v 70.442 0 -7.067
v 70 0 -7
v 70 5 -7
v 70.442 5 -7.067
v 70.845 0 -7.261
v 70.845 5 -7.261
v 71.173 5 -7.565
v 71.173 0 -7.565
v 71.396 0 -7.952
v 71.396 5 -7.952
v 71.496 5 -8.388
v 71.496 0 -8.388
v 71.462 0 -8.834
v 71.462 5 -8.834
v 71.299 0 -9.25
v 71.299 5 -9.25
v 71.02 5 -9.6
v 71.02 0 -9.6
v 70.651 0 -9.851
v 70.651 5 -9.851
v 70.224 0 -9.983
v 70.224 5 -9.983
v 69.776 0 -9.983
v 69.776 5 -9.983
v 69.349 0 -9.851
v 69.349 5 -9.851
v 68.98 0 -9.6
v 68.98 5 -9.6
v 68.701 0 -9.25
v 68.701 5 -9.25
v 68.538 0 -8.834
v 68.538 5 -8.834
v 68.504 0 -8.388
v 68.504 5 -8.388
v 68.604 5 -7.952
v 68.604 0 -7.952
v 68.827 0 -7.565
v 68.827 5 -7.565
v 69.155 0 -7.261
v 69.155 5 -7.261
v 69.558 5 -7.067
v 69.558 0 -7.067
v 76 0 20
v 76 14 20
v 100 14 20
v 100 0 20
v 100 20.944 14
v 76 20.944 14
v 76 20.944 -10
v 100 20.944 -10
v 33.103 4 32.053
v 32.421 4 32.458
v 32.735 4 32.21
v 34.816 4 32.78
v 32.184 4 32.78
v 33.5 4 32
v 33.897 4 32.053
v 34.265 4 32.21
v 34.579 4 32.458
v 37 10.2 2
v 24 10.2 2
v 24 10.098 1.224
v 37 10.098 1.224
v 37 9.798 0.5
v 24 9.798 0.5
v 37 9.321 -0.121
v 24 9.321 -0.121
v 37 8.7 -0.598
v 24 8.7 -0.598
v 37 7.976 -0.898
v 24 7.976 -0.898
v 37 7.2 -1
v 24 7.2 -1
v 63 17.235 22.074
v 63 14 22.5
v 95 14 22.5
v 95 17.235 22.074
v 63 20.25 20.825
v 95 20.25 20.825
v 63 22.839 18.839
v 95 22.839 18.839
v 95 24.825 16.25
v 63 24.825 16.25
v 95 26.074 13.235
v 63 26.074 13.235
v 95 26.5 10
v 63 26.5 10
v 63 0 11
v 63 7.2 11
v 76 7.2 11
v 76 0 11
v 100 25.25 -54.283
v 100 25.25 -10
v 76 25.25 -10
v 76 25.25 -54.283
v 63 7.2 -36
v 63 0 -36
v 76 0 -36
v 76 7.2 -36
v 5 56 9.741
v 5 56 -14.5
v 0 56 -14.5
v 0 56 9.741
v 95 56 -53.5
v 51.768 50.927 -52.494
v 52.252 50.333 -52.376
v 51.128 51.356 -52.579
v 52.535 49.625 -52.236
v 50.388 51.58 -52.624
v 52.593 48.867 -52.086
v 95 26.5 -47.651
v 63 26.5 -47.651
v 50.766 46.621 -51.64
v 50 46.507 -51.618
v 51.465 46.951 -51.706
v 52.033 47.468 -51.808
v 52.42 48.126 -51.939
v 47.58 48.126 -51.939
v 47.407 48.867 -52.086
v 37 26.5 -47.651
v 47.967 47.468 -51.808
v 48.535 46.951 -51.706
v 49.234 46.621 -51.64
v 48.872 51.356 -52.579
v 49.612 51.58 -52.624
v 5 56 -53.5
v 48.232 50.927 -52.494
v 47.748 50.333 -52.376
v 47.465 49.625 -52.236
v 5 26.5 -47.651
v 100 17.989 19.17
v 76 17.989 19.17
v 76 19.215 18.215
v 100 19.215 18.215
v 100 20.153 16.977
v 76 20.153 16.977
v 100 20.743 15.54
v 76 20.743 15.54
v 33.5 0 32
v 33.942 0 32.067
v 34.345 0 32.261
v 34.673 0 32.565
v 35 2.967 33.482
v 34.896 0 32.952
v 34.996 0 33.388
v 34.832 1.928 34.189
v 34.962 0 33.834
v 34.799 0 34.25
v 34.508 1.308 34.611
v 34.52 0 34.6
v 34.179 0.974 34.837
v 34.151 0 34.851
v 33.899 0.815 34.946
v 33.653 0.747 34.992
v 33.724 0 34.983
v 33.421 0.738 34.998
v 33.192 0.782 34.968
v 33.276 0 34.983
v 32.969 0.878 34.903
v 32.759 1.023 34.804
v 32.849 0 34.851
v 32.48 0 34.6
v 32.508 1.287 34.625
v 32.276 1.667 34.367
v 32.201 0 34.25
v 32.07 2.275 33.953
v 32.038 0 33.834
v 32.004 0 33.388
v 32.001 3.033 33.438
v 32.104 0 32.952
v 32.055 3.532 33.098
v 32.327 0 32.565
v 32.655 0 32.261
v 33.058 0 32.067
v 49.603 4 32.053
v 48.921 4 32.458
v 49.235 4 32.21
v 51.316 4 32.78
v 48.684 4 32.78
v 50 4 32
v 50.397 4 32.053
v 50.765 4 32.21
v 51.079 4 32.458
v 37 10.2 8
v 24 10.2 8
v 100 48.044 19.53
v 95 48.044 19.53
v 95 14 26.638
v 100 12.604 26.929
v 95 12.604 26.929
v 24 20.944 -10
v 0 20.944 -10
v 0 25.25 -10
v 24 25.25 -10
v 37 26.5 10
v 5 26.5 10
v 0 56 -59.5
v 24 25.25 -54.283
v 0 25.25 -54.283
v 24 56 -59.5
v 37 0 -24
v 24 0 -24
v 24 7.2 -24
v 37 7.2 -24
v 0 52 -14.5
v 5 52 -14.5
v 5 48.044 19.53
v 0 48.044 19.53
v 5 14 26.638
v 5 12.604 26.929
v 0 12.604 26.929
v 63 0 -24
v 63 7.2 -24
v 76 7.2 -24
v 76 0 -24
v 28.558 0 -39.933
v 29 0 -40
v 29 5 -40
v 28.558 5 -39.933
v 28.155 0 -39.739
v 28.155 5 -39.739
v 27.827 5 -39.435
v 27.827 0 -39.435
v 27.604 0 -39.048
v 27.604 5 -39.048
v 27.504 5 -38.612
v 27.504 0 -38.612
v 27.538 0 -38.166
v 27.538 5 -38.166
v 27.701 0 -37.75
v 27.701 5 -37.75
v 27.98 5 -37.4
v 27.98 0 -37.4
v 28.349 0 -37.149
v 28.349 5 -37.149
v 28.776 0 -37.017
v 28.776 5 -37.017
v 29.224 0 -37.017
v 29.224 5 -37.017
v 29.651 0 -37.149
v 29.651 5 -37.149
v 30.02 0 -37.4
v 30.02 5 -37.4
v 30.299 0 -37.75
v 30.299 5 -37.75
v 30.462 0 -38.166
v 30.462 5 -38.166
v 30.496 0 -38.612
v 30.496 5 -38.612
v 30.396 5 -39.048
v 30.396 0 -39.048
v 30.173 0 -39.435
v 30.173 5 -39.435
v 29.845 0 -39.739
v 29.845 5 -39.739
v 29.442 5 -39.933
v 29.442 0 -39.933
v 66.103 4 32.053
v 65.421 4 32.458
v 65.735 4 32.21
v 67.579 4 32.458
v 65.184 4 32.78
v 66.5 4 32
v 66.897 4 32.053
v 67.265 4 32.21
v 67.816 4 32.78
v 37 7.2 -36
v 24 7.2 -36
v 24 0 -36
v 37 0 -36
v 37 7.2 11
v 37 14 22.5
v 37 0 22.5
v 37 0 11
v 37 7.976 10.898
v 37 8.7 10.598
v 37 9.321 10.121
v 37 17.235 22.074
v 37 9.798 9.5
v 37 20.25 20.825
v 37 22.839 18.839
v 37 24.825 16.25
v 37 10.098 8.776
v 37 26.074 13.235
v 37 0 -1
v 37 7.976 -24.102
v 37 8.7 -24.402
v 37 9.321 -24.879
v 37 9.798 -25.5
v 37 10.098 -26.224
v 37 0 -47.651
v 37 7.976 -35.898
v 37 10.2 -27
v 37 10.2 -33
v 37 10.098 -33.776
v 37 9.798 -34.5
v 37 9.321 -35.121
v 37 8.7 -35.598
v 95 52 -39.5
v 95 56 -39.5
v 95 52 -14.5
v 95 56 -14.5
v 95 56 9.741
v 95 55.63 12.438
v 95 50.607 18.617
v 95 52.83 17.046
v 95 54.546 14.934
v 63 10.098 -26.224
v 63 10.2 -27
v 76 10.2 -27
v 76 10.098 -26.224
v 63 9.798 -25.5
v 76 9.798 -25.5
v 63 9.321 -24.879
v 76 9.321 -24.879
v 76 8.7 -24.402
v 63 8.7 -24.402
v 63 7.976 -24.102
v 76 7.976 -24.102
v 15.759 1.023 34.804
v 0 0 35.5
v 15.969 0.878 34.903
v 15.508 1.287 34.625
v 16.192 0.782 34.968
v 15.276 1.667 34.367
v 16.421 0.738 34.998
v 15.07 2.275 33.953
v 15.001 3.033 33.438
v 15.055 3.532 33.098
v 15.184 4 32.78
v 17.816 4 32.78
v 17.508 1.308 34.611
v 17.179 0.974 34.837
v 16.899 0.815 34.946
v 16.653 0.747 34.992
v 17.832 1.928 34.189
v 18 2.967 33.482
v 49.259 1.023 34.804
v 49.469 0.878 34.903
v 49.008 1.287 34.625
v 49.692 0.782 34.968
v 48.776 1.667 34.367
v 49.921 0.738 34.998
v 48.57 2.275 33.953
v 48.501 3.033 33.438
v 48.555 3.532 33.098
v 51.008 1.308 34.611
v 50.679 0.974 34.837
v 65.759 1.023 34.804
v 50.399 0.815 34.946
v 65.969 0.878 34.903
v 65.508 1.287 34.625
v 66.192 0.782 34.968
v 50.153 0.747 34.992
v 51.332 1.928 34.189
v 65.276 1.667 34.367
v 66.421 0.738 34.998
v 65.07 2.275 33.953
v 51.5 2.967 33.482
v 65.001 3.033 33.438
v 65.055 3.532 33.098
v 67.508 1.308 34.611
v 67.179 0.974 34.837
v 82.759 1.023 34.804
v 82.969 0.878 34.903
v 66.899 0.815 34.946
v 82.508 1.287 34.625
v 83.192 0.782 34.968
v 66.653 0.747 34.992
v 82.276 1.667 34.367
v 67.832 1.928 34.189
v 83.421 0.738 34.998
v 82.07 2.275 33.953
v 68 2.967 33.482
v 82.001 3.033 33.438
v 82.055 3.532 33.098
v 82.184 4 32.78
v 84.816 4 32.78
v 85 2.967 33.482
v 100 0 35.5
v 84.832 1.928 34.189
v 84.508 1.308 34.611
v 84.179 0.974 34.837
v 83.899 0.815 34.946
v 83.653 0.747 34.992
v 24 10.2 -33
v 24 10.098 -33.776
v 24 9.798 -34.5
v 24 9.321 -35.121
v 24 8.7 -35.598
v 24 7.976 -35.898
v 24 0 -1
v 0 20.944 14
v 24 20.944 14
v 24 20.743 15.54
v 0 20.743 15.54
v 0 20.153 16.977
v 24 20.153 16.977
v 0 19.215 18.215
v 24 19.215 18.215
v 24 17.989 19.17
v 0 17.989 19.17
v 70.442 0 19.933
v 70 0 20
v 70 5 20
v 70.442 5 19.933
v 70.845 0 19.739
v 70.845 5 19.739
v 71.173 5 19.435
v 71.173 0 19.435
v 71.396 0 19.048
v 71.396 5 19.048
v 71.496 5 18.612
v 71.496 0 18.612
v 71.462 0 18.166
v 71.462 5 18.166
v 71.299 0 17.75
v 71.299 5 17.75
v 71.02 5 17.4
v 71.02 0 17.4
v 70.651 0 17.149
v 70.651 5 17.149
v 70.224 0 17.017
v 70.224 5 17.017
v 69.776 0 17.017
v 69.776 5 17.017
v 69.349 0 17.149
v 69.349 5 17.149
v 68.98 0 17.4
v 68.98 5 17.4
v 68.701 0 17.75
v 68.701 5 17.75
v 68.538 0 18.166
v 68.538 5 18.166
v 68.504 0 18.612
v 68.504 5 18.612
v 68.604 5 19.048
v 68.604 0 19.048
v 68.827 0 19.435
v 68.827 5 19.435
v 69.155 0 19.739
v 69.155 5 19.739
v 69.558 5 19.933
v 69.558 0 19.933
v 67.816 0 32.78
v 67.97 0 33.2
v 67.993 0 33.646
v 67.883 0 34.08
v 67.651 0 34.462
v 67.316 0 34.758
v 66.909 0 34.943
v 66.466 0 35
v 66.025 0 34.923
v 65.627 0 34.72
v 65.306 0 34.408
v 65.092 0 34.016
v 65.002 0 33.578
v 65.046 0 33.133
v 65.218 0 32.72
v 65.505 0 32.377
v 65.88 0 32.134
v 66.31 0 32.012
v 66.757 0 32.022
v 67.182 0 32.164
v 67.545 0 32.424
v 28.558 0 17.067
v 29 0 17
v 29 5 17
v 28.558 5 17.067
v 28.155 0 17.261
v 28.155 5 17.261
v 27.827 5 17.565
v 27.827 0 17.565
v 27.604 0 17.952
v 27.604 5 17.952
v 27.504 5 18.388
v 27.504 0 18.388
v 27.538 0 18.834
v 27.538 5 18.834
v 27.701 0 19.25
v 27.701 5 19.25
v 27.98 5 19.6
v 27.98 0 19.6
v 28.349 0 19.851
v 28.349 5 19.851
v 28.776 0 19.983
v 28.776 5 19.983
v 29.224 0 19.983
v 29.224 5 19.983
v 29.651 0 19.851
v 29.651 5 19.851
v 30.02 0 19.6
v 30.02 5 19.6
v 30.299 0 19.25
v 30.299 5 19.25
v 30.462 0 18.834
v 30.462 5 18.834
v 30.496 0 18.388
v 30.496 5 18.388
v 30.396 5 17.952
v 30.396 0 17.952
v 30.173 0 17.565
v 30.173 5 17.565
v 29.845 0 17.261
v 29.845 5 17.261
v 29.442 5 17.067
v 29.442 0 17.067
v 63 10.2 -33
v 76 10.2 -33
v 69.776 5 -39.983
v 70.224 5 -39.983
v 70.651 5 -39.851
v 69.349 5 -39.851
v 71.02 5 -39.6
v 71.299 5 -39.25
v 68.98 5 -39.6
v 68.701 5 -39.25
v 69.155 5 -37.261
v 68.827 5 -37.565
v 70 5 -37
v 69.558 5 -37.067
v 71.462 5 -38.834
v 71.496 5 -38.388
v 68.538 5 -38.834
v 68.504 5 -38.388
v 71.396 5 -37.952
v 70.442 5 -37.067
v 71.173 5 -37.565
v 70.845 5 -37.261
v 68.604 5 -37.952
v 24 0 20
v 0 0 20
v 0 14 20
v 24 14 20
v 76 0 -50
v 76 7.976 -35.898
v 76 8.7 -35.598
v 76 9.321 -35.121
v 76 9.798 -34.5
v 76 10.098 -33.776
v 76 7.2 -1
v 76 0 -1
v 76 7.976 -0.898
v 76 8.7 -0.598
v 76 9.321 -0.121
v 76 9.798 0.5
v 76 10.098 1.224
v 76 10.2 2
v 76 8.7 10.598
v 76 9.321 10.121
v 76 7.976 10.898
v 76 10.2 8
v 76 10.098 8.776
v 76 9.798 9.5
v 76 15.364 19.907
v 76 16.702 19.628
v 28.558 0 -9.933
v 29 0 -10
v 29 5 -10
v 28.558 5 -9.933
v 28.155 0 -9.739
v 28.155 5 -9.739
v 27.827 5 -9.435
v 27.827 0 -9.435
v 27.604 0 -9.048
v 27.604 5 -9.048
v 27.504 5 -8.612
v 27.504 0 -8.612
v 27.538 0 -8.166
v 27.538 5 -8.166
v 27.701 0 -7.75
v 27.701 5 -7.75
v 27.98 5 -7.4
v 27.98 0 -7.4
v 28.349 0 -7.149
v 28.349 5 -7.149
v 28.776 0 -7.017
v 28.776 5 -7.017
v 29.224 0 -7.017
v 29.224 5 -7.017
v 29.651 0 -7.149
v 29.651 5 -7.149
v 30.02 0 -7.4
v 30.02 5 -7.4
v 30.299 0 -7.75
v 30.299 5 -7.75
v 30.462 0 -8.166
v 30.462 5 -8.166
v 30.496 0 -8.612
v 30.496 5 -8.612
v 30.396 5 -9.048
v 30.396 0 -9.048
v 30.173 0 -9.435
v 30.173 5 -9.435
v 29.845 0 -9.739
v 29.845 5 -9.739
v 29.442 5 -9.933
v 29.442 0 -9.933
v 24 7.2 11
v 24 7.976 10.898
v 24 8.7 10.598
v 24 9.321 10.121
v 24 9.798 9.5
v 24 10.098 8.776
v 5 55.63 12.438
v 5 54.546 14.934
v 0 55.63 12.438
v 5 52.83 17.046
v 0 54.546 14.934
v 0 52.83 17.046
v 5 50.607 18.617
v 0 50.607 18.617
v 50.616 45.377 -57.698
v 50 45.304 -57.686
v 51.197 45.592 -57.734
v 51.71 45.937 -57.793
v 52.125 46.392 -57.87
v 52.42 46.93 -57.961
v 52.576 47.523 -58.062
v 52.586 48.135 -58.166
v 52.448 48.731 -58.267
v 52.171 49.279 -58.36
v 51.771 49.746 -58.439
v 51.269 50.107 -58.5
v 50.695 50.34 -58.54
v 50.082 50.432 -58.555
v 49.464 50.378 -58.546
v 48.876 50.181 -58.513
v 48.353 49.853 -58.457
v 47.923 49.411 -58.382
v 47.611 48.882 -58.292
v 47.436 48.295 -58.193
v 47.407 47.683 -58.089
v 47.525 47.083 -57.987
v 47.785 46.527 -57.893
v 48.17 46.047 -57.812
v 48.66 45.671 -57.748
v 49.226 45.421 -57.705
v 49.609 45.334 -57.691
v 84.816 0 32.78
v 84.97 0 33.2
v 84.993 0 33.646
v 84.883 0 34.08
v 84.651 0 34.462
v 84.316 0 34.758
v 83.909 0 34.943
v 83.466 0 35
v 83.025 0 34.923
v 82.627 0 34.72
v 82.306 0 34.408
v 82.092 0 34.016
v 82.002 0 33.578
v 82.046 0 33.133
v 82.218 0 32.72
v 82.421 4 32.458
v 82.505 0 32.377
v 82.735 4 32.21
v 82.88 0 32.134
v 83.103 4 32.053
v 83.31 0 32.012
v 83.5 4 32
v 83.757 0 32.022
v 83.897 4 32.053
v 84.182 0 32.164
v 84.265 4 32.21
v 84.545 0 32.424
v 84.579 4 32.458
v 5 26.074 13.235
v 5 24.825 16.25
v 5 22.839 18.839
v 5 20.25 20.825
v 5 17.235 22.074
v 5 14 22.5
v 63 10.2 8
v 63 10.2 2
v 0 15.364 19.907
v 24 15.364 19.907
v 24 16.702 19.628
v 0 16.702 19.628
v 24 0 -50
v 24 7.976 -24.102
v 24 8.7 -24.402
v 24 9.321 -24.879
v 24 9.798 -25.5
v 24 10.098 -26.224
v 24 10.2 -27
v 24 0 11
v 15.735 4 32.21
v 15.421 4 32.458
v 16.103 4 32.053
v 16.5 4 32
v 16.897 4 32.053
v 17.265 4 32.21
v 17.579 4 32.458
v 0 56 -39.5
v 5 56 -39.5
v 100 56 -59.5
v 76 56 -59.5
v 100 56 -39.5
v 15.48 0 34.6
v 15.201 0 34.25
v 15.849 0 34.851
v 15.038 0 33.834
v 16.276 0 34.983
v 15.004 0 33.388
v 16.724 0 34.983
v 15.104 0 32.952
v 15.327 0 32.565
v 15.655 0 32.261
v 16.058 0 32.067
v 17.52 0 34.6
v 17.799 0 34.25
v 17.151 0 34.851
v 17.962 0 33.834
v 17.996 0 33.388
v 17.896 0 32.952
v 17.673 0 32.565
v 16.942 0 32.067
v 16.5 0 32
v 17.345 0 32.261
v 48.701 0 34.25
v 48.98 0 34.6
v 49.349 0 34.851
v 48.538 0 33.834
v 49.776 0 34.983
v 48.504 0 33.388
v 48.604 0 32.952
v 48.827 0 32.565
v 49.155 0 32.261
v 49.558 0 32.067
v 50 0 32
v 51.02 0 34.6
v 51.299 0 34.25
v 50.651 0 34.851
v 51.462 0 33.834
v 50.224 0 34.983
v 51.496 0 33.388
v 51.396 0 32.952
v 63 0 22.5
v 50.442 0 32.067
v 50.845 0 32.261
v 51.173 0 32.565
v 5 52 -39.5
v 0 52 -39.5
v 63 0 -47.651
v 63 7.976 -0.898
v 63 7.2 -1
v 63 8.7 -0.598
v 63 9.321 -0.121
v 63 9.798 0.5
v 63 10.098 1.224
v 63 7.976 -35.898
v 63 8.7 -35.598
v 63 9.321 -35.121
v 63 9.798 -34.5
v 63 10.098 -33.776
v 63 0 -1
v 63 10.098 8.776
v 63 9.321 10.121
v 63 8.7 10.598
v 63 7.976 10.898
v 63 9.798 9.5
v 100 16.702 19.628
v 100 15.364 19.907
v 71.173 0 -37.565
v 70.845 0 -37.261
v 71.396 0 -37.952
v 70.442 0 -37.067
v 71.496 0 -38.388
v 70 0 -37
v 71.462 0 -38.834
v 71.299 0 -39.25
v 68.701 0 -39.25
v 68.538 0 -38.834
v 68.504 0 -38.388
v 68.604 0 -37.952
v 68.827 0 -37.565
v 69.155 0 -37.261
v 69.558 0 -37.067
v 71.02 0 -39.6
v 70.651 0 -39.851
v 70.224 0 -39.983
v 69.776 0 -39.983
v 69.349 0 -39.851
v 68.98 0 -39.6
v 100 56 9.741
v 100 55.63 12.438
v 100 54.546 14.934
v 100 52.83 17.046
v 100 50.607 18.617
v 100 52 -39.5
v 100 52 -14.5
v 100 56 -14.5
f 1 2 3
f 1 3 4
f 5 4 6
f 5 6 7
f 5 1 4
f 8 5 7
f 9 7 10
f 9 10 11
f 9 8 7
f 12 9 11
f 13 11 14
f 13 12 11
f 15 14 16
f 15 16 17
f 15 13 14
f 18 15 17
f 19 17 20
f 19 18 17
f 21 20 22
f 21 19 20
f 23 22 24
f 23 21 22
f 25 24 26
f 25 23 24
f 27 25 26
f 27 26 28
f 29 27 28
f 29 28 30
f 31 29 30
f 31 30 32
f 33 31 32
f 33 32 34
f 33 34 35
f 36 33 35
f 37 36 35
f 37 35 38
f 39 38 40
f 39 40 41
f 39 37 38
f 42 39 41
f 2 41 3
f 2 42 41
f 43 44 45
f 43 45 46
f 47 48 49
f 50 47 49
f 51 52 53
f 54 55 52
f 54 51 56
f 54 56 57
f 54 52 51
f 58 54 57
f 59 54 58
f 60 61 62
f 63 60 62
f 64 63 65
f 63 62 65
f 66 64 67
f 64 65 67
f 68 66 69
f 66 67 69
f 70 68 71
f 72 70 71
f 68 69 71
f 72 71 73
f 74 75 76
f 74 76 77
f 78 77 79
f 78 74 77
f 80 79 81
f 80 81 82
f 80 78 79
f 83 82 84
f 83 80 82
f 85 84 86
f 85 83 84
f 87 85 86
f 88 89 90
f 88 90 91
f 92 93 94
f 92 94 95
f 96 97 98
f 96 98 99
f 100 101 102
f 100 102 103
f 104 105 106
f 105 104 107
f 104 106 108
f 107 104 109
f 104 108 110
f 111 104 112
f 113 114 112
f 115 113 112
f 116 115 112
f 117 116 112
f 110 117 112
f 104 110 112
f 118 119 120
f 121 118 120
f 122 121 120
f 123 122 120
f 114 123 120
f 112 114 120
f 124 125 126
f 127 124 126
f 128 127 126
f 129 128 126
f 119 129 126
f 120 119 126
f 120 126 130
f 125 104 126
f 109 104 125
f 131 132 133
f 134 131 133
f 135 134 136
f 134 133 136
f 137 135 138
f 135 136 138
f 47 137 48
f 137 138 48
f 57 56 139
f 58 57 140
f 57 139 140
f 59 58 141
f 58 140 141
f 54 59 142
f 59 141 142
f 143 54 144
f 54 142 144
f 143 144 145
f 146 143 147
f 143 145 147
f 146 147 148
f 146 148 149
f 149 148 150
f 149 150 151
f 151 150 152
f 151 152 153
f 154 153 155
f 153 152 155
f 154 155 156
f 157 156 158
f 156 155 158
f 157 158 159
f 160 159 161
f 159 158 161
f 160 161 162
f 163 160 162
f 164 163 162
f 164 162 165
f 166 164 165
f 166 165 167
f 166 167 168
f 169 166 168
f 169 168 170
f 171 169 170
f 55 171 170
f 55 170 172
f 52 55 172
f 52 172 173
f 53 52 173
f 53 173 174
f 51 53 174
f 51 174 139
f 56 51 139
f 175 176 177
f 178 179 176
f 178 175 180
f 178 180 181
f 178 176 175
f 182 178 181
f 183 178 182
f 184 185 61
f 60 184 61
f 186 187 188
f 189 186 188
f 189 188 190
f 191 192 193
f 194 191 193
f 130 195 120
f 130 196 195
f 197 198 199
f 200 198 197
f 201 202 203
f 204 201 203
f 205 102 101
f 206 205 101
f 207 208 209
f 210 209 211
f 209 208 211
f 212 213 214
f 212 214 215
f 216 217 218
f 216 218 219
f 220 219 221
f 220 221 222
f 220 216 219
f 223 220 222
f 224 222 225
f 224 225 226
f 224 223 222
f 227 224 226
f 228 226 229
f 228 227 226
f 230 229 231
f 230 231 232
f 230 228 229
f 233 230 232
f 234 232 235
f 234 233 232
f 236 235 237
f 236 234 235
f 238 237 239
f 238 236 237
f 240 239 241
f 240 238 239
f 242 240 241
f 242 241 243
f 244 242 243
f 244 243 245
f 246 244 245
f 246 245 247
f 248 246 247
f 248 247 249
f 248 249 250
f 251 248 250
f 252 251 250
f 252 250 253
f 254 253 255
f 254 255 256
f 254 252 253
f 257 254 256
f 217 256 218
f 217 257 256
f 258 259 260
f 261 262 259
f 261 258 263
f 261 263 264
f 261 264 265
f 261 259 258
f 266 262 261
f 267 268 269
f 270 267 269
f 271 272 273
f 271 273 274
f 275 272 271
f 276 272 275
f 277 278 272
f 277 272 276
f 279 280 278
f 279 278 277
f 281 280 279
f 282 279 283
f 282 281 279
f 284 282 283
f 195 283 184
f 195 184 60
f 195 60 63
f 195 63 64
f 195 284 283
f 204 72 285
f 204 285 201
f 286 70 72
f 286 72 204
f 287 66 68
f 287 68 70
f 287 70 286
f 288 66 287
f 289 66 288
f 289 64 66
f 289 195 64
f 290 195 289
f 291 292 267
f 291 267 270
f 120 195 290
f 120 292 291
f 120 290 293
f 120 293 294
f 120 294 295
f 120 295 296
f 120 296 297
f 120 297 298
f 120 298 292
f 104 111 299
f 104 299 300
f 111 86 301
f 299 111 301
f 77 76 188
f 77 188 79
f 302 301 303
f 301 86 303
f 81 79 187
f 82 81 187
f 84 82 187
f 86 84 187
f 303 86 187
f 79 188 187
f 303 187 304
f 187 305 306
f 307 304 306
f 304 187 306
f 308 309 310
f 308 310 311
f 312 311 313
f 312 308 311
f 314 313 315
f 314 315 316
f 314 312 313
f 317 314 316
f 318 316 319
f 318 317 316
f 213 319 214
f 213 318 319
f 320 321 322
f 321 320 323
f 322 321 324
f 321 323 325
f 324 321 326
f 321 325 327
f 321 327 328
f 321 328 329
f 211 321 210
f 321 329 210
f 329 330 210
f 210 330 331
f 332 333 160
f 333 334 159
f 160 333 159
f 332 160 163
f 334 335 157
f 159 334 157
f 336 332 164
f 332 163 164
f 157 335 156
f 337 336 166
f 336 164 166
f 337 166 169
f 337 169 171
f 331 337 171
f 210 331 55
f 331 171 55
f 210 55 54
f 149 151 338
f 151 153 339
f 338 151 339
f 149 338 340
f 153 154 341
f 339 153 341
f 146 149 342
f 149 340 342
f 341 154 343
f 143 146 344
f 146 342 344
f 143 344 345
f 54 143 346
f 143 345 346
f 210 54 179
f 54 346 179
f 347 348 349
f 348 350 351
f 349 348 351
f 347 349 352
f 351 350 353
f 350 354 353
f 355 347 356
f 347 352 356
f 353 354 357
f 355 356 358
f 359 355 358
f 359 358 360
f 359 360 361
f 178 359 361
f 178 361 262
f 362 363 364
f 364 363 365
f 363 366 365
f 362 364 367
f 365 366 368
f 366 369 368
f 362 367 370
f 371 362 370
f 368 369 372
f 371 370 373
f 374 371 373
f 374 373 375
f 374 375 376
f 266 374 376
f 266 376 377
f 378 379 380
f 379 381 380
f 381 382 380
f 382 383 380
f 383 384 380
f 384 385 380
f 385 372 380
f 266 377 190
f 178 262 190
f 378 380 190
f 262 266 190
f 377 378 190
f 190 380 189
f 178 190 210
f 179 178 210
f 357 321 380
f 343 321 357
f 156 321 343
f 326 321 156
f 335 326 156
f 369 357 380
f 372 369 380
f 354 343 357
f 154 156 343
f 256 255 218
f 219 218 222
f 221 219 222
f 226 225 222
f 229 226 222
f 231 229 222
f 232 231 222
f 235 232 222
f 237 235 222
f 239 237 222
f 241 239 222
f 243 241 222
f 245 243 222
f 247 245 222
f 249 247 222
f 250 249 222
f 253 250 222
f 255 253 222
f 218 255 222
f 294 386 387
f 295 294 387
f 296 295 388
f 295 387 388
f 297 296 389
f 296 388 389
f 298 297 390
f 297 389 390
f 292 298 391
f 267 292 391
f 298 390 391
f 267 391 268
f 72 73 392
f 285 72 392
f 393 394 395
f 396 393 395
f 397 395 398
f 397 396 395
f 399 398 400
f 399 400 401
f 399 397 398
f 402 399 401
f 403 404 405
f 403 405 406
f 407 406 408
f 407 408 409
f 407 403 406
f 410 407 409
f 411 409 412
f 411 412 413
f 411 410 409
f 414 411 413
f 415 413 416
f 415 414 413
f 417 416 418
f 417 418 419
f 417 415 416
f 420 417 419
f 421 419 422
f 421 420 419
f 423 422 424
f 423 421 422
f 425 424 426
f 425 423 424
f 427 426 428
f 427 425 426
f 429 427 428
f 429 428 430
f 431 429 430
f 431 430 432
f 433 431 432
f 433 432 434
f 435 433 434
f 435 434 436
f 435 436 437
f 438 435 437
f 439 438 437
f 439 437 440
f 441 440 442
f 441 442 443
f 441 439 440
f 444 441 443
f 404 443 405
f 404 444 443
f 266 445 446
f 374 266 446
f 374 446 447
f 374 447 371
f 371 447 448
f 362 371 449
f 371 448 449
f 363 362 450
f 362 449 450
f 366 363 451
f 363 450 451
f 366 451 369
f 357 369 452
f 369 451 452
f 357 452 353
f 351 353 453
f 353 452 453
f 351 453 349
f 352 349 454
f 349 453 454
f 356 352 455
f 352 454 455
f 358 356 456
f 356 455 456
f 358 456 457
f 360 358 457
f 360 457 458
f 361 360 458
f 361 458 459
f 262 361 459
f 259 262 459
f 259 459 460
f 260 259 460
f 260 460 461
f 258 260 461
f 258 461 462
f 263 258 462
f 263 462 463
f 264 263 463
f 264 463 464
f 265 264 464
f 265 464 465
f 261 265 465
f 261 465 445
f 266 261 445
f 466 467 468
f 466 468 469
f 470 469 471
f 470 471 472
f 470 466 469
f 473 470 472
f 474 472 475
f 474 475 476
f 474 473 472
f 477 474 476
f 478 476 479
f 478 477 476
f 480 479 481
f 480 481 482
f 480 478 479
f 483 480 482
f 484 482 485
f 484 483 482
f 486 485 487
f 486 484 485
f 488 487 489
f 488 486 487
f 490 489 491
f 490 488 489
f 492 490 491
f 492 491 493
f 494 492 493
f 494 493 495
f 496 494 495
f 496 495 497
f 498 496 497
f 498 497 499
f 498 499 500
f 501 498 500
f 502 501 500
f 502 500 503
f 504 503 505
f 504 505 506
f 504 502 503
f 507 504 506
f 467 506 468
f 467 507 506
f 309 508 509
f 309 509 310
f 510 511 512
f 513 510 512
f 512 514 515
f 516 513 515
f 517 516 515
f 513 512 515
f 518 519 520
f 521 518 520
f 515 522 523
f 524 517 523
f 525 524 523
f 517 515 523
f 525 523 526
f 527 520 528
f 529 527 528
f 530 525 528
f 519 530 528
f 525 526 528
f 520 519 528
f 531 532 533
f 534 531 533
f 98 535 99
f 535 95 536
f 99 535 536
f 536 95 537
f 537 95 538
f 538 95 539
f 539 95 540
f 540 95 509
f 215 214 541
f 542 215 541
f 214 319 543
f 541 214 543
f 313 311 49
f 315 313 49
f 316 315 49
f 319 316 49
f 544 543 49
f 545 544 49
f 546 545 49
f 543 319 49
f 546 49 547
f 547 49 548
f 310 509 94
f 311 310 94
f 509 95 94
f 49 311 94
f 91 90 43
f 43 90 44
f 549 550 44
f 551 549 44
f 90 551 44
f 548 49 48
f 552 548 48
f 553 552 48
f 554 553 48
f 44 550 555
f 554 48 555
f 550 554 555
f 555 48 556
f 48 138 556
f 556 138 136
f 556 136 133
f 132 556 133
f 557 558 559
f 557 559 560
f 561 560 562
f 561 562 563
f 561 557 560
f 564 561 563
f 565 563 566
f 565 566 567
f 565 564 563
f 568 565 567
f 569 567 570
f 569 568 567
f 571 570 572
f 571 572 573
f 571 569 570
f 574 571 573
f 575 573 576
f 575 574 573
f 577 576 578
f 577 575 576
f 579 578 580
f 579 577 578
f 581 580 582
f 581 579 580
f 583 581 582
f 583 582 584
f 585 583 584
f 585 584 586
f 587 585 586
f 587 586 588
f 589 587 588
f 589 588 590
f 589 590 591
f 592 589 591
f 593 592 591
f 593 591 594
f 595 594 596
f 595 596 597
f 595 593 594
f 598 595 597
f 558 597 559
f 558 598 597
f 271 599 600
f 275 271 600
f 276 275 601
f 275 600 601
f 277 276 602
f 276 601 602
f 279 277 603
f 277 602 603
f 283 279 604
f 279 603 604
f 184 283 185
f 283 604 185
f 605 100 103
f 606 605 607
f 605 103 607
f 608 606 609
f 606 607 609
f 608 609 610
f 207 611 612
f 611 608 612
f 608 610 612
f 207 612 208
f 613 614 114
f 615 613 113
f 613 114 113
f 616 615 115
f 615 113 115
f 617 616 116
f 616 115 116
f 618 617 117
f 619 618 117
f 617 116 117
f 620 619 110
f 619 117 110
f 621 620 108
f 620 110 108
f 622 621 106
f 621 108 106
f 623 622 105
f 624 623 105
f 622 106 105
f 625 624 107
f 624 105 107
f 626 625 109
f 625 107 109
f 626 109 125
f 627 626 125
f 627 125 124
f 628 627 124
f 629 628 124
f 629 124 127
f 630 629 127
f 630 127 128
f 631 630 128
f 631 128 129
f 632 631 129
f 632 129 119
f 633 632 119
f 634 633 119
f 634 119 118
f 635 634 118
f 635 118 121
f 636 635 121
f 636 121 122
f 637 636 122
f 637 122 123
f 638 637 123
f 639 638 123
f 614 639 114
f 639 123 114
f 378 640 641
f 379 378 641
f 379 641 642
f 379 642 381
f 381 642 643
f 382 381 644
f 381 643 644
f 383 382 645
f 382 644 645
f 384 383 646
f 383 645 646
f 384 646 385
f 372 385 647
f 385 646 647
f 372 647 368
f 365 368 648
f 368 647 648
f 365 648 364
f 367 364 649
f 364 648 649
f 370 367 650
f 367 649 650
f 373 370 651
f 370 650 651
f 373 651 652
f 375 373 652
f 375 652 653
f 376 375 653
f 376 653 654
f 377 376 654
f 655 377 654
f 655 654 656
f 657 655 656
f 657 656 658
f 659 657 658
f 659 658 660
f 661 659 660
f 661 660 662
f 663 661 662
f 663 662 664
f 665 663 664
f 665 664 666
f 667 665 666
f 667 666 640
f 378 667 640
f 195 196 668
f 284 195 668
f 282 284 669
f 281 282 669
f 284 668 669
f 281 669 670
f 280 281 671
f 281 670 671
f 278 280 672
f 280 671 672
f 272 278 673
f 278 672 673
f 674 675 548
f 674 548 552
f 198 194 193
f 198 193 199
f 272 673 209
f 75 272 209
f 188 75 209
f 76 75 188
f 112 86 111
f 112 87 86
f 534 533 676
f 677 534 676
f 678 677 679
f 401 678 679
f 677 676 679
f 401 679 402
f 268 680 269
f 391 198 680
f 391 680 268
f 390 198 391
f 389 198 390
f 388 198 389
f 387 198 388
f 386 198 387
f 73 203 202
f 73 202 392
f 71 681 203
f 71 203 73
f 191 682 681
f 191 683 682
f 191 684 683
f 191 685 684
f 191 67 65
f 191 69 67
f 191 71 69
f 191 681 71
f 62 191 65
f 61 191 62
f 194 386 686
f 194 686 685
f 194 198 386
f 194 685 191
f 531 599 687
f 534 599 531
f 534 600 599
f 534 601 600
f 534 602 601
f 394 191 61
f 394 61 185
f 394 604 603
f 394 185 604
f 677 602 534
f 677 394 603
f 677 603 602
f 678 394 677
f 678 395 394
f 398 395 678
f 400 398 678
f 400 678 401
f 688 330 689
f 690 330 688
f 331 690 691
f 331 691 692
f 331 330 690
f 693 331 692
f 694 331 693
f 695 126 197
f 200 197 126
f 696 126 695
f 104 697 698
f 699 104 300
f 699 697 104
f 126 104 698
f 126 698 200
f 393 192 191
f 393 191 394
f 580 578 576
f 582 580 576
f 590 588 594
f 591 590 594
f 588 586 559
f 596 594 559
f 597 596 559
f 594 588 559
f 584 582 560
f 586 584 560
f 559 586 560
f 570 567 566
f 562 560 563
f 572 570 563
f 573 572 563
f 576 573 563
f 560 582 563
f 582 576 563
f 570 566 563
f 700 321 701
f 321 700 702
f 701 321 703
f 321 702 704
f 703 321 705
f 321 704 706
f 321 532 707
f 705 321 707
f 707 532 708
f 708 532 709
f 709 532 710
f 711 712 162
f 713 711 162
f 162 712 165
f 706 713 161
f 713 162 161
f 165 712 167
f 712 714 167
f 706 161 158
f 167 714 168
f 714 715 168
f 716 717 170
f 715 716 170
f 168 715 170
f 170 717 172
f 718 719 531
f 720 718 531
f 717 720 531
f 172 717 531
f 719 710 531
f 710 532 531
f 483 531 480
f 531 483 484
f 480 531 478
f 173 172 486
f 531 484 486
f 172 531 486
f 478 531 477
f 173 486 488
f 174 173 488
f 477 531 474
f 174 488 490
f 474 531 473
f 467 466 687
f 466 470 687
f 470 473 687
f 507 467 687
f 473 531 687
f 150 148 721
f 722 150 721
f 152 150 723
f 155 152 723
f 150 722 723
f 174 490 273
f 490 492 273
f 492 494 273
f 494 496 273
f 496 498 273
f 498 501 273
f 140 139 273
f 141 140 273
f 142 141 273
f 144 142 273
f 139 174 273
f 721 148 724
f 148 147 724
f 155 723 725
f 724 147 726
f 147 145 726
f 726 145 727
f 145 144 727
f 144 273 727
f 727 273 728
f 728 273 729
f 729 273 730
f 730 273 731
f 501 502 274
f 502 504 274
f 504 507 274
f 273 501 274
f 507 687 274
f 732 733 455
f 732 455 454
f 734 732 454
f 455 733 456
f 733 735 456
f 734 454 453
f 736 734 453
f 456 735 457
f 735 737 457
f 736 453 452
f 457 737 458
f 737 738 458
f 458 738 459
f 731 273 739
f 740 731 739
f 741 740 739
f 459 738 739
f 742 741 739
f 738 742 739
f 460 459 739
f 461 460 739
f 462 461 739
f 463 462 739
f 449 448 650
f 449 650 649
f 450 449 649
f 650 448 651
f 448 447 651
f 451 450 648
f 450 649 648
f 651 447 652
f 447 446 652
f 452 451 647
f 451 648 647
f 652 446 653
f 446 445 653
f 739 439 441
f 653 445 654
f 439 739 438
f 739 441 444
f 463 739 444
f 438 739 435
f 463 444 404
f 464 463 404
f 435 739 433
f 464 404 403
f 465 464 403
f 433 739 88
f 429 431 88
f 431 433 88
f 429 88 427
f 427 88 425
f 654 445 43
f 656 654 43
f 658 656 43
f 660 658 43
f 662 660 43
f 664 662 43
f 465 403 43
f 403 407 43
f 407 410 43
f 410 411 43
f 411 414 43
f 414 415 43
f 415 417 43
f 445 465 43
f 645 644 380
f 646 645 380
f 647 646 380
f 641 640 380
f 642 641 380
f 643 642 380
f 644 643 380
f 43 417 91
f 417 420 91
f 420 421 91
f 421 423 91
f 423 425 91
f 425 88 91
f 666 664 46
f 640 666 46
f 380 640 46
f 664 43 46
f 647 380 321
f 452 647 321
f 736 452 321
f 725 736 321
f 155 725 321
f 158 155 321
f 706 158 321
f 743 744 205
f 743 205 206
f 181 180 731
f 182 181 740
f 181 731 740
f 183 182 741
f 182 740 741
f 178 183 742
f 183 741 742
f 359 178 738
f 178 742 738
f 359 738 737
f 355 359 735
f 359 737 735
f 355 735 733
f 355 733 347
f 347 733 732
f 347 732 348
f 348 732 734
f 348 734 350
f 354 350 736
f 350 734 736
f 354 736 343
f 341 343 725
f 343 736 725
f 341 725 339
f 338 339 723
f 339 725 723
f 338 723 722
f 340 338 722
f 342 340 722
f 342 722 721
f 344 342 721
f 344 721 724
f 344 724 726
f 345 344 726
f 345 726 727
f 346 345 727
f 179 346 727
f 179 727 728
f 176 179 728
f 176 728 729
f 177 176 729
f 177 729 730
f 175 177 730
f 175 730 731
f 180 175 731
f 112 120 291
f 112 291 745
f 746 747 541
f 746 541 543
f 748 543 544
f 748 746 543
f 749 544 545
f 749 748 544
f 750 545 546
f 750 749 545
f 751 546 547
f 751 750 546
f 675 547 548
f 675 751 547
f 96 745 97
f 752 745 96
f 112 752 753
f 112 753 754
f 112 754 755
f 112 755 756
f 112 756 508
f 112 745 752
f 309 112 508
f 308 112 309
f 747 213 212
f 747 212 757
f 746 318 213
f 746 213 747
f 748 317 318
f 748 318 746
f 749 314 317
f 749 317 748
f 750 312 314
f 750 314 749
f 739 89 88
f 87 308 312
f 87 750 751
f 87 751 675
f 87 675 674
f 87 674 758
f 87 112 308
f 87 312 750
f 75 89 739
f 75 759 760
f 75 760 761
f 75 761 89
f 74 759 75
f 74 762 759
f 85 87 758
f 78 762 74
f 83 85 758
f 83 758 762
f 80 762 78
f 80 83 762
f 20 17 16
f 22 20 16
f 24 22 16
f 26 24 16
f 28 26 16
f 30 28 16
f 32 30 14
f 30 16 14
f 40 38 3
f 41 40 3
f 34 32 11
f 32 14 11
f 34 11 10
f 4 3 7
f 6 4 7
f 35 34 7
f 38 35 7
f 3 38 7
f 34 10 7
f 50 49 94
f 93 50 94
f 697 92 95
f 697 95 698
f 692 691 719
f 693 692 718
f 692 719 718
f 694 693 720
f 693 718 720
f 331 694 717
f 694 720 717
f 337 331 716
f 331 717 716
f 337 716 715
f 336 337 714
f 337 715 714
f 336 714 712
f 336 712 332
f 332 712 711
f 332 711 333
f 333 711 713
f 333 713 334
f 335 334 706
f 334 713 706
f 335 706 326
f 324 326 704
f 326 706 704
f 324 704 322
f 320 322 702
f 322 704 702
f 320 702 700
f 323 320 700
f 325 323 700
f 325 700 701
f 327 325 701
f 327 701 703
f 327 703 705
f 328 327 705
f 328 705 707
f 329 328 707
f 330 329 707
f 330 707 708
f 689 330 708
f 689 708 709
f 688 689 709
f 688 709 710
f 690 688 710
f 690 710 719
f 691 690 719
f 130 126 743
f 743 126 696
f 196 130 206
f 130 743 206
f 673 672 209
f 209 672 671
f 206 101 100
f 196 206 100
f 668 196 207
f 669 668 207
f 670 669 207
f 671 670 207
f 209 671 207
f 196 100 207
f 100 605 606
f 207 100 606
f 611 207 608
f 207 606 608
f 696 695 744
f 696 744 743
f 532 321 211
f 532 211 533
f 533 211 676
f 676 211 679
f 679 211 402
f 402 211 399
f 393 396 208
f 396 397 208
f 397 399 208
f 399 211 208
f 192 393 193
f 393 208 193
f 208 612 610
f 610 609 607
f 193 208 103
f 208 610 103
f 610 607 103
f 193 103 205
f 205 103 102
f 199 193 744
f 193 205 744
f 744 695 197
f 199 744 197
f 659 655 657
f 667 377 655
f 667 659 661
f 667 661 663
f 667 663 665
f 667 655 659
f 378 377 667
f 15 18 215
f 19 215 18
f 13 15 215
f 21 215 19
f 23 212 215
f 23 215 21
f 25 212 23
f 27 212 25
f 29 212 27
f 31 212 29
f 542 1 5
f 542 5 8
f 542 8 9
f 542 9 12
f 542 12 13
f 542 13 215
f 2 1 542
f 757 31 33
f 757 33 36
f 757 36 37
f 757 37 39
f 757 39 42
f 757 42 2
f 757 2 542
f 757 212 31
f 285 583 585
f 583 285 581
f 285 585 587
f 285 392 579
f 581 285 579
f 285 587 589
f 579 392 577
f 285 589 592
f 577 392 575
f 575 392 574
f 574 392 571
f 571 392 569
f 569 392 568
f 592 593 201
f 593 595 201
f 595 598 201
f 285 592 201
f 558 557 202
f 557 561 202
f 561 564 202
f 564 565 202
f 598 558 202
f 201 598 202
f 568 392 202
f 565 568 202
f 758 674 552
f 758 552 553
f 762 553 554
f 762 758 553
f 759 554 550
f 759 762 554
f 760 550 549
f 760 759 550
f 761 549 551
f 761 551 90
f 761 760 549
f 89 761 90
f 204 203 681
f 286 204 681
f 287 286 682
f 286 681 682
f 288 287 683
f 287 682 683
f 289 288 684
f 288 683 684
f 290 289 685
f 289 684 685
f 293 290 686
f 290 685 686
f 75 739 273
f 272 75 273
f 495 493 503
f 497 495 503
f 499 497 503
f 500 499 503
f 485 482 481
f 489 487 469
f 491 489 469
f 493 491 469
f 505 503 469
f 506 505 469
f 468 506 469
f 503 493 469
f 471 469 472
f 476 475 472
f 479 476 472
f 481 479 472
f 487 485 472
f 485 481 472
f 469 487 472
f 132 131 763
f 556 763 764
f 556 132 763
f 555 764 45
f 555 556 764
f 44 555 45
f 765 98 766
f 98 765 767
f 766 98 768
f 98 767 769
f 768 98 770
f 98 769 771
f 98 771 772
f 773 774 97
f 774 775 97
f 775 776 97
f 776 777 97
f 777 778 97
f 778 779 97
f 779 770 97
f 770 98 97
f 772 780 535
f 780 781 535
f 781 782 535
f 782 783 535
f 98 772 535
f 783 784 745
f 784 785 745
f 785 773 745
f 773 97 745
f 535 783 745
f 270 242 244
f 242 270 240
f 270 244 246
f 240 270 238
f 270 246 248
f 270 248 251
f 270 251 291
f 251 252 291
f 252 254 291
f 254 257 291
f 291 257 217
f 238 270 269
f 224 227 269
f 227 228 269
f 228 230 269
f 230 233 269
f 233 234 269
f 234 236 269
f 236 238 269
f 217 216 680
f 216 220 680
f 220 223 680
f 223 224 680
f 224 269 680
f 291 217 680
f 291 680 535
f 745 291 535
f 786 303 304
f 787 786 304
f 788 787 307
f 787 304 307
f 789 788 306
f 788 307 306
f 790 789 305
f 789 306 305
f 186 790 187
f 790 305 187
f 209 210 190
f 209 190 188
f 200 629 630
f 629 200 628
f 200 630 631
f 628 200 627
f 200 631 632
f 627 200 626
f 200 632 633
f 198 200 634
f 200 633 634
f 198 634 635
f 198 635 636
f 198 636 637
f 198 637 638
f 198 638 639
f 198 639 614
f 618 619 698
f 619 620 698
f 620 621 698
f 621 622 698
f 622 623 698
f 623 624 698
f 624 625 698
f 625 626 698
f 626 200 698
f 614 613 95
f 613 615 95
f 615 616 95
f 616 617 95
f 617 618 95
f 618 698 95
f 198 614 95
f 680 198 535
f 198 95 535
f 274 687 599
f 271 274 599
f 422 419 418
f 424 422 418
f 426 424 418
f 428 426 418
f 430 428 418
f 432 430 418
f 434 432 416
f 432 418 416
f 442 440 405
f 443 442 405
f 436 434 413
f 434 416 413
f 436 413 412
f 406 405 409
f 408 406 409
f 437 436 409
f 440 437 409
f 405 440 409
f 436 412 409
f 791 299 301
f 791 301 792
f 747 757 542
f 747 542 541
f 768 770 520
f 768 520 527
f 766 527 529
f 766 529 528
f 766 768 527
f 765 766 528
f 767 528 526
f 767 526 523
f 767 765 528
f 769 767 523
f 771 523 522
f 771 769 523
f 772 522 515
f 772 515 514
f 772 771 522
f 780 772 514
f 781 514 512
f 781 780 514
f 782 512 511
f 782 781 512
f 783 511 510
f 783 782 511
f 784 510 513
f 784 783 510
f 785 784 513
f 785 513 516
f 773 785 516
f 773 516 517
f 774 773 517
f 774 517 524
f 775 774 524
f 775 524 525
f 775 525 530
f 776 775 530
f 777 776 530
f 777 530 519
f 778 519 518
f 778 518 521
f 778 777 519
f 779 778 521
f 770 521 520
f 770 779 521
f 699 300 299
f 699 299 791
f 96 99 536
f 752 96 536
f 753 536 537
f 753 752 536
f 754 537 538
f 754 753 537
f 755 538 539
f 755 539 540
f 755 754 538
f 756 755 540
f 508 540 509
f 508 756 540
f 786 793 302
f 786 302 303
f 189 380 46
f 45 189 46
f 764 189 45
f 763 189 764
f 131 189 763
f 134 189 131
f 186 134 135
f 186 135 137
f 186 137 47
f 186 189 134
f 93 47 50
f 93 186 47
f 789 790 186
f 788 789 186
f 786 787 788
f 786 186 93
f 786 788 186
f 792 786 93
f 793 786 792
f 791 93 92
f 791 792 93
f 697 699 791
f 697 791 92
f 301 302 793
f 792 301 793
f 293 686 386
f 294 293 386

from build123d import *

# Parameters (mm, degrees)
SALIENTE_EXTRUIR1_DEPTH  = 100
CROQUIS4_W               = 90
CROQUIS4_H               = 70
CORTAR_EXTRUIR1_DEPTH    = 44
SALIENTE_EXTRUIR2_DEPTH  = 19
SALIENTE_EXTRUIR4_START  = 19
SALIENTE_EXTRUIR4_DEPTH  = 19
SALIENTE_EXTRUIR7_DEPTH  = 13
SALIENTE_EXTRUIR28_START = 13
CROQUIS11_W              = 34
CROQUIS11_H              = 2.5
SALIENTE_EXTRUIR28_DEPTH = 13
CROQUIS13_W              = 28
CROQUIS13_H              = 6
SALIENTE_EXTRUIR10_DEPTH = 24
CROQUIS15_R              = 1.5
CORTAR_EXTRUIR2_DEPTH    = 5
CORTAR_EXTRUIR3_DEPTH    = 24
SALIENTE_EXTRUIR12_START = -28
SALIENTE_EXTRUIR12_DEPTH = 28
SALIENTE_EXTRUIR13_DEPTH = 52
SALIENTE_EXTRUIR14_DEPTH = 100
CORTAR_EXTRUIR4_DEPTH    = 24
SALIENTE_EXTRUIR15_DEPTH = 24
CORTAR_EXTRUIR7_DEPTH    = 90
SALIENTE_EXTRUIR27_DEPTH = 14
CORTAR_EXTRUIR12_DEPTH   = 90
CROQUIS41_R              = 2.6
CORTAR_EXTRUIR13_DEPTH   = 10
CROQUIS42_W              = 26
CROQUIS42_H              = 3.651340431
CORTAR_EXTRUIR14_DEPTH   = 121.043742028
CROQUIS37_W              = 5
CROQUIS37_H              = 25
CORTAR_EXTRUIR15_DEPTH   = 4
CROQUIS44_R              = 1.5
CORTAR_EXTRUIR16_DEPTH   = 4


with BuildPart() as part:
    # Croquis1 → Saliente-Extruir1 (new body)
    with BuildSketch(Plane(origin=(0, 0, 0), x_dir=(0, 0, -1), z_dir=(1, 0, 0))):
        with BuildLine():
            Line((50, 24), (50, 56))
            Line((50, 56), (-1.5, 56))
            Line((-1.5, 56), (-9.741455248, 56))
            ThreePointArc((-9.741455248, 56), (-16.048737738, 53.76003786), (-19.530405432, 48.043637519))
            Line((-19.530405432, 48.043637519), (-26.9291309, 12.604008733))
            Line((-26.9291309, 12.604008733), (-35.5, 0))
            Line((-35.5, 0), (-20, 0))
            Line((-20, 0), (-20, 14))
            ThreePointArc((-20, 14), (-17.071067812, 21.071067812), (-10, 24))
            Line((-10, 24), (50, 24))
        make_face()
    extrude(amount=SALIENTE_EXTRUIR1_DEPTH)

    # Croquis4 → Cortar-Extruir1 (cut, symmetric)
    with BuildSketch(Plane.XY):
        with Locations((50, 35)):
            Rectangle(CROQUIS4_W, CROQUIS4_H)
    extrude(amount=CORTAR_EXTRUIR1_DEPTH, both=True, mode=Mode.SUBTRACT)

    # Croquis5 → Saliente-Extruir2 (add)
    with BuildSketch(Plane(origin=(5, 0, 0), x_dir=(0, 0, -1), z_dir=(1, 0, 0))):
        with BuildLine():
            Line((-20, 0), (-20, 14))
            ThreePointArc((-20, 14), (-17.071067812, 21.071067812), (-10, 24))
            Line((-10, 24), (50, 24))
            Line((50, 24), (50, 26.5))
            Line((50, 26.5), (-10, 26.5))
            ThreePointArc((-10, 26.5), (-18.838834765, 22.838834765), (-22.5, 14))
            Line((-22.5, 14), (-22.5, 0))
            Line((-22.5, 0), (-20, 0))
        make_face()
    extrude(amount=SALIENTE_EXTRUIR2_DEPTH)

    # Croquis7 → Saliente-Extruir4 (add)
    with BuildSketch(Plane.ZY.offset(-95).offset(SALIENTE_EXTRUIR4_START)):
        with BuildLine():
            Line((20, 14), (20, 0))
            Line((20, 0), (22.5, 0))
            Line((22.5, 0), (22.5, 14))
            ThreePointArc((22.5, 14), (18.838834765, 22.838834765), (10, 26.5))
            Line((10, 26.5), (-50, 26.5))
            Line((-50, 26.5), (-50, 24))
            Line((-50, 24), (10, 24))
            ThreePointArc((10, 24), (17.071067812, 21.071067812), (20, 14))
        make_face()
    extrude(amount=-SALIENTE_EXTRUIR4_DEPTH)

    # Croquis10 → Saliente-Extruir7 (add)
    with BuildSketch(Plane(origin=(24, 0, 0), x_dir=(0, 0, -1), z_dir=(1, 0, 0))):
        with BuildLine():
            Line((50, 26.5), (-10, 26.5))
            ThreePointArc((-10, 26.5), (-18.838834765, 22.838834765), (-22.5, 14))
            Line((-22.5, 14), (-22.5, 0))
            Line((-22.5, 0), (-11, 0))
            Line((-11, 0), (-11, 7.2))
            ThreePointArc((-11, 7.2), (-10.121320344, 9.321320344), (-8, 10.2))
            Line((-8, 10.2), (-2, 10.2))
            ThreePointArc((-2, 10.2), (0.121320344, 9.321320344), (1, 7.2))
            Line((1, 7.2), (1, 0))
            Line((1, 0), (24, 0))
            Line((24, 0), (24, 7.2))
            ThreePointArc((24, 7.2), (24.878679656, 9.321320344), (27, 10.2))
            Line((27, 10.2), (33, 10.2))
            ThreePointArc((33, 10.2), (35.121320344, 9.321320344), (36, 7.2))
            Line((36, 7.2), (36, 0))
            Line((36, 0), (50, 0))
            Line((50, 0), (50, 26.5))
        make_face()
    extrude(amount=SALIENTE_EXTRUIR7_DEPTH)

    # Croquis11 → Saliente-Extruir28 (add)
    with BuildSketch(Plane.ZY.offset(-76).offset(SALIENTE_EXTRUIR28_START)):
        with BuildLine():
            Line((10, 24), (-10, 24))
            Line((-10, 24), (-10, 0))
            Line((-10, 0), (-1, 0))
            Line((-1, 0), (-1, 7.2))
            ThreePointArc((-1, 7.2), (-0.121320344, 9.321320344), (2, 10.2))
            Line((2, 10.2), (8, 10.2))
            ThreePointArc((8, 10.2), (10.121320344, 9.321320344), (11, 7.2))
            Line((11, 7.2), (11, 0))
            Line((11, 0), (20, 0))
            Line((20, 0), (20, 14))
            ThreePointArc((20, 14), (17.071067812, 21.071067812), (10, 24))
        make_face()
        with BuildLine():
            Line((-10, 0), (-10, 24))
            Line((-10, 24), (-44, 24))
            Line((-44, 24), (-44, 26.5))
            Line((-44, 26.5), (-50, 26.5))
            Line((-50, 26.5), (-50, 24))
            Line((-50, 24), (-50, 0))
            Line((-50, 0), (-36, 0))
            Line((-36, 0), (-36, 7.2))
            ThreePointArc((-36, 7.2), (-35.121320344, 9.321320344), (-33, 10.2))
            Line((-33, 10.2), (-27, 10.2))
            ThreePointArc((-27, 10.2), (-24.878679656, 9.321320344), (-24, 7.2))
            Line((-24, 7.2), (-24, 0))
            Line((-24, 0), (-10, 0))
        make_face()
        with Locations((-27, 25.25)):
            Rectangle(CROQUIS11_W, CROQUIS11_H)
        with BuildLine():
            Line((10, 26.5), (-10, 26.5))
            Line((-10, 26.5), (-10, 24))
            Line((-10, 24), (10, 24))
            ThreePointArc((10, 24), (17.071067812, 21.071067812), (20, 14))
            Line((20, 14), (20, 0))
            Line((20, 0), (22.5, 0))
            Line((22.5, 0), (22.5, 14))
            ThreePointArc((22.5, 14), (18.838834765, 22.838834765), (10, 26.5))
        make_face()
    extrude(amount=-SALIENTE_EXTRUIR28_DEPTH)

    # Croquis13 → Saliente-Extruir10 (add)
    with BuildSketch(Plane.XZ.offset(-24)):
        with Locations((50, -47)):
            Rectangle(CROQUIS13_W, CROQUIS13_H)
    extrude(amount=SALIENTE_EXTRUIR10_DEPTH)

    # Croquis15 → Cortar-Extruir2 (cut)
    with BuildSketch(Plane(origin=(0, 0, 0), x_dir=(1, 0, 0), z_dir=(0, 1, 0))):
        with Locations(Location((70, 38.5, 0), (0, 0, 270))):
            Circle(CROQUIS15_R)
        with Locations(Location((70, 8.5, 0), (0, 0, 270))):
            Circle(CROQUIS15_R)
        with Locations(Location((70, -18.5, 0), (0, 0, 270))):
            Circle(CROQUIS15_R)
        with Locations(Location((29, -18.5, 0), (0, 0, 90))):
            Circle(CROQUIS15_R)
        with Locations(Location((29, 8.5, 0), (0, 0, 90))):
            Circle(CROQUIS15_R)
        with Locations(Location((29, 38.5, 0), (0, 0, 90))):
            Circle(CROQUIS15_R)
    extrude(amount=CORTAR_EXTRUIR2_DEPTH, mode=Mode.SUBTRACT)

    # Croquis16 → Cortar-Extruir3 (cut)
    with BuildSketch(Plane(origin=(100, 0, 0), x_dir=(0, 0, -1), z_dir=(1, 0, 0))):
        with BuildLine():
            Line((10, 24.25), (10, 24))
            Line((10, 24), (50, 24))
            Line((50, 24), (50.733673202, 24))
            Line((50.733673202, 24), (50.733673202, 28.25))
            Line((50.733673202, 28.25), (50, 28.25))
            Line((50, 28.25), (50, 27.25))
            ThreePointArc((50, 27.25), (49.414213562, 25.835786438), (48, 25.25))
            Line((48, 25.25), (11, 25.25))
            Line((11, 25.25), (10, 25.25))
            Line((10, 25.25), (10, 24.25))
        make_face()
    extrude(amount=-CORTAR_EXTRUIR3_DEPTH, mode=Mode.SUBTRACT)

    # Croquis17 → Saliente-Extruir12 (add)
    with BuildSketch(Plane(origin=(100, 0, 0), x_dir=(0, 0, -1), z_dir=(1, 0, 0)).offset(SALIENTE_EXTRUIR12_START)):
        with BuildLine():
            Line((-14, 20.944171176), (7, 20.944171176))
            Line((7, 20.944171176), (10, 20.944171176))
            Line((10, 20.944171176), (10, 23.944171176))
            Line((10, 23.944171176), (10, 24))
            Line((10, 24), (10, 26.5))
            Line((10, 26.5), (-10, 26.5))
            ThreePointArc((-10, 26.5), (-18.838834765, 22.838834765), (-22.5, 14))
            Line((-22.5, 14), (-20, 14))
            Line((-20, 14), (-20, 14.944171176))
            ThreePointArc((-20, 14.944171176), (-18.242640687, 19.186811864), (-14, 20.944171176))
        make_face()
    extrude(amount=SALIENTE_EXTRUIR12_DEPTH)

    # Croquis18 → Saliente-Extruir13 (add)
    with BuildSketch(Plane(origin=(76, 0, 0), x_dir=(0, 0, -1), z_dir=(1, 0, 0))):
        Polygon((50, 0), (50, 56), (59.5, 56), align=None)
    extrude(amount=-SALIENTE_EXTRUIR13_DEPTH)

    # Croquis19 → Saliente-Extruir14 (add)
    with BuildSketch(Plane(origin=(100, 0, 0), x_dir=(0, 0, -1), z_dir=(1, 0, 0))):
        with BuildLine():
            Line((48, 25.25), (54.283482143, 25.25))
            Line((54.283482143, 25.25), (59.5, 56))
            Line((59.5, 56), (50, 56))
            Line((50, 56), (50, 27.25))
            ThreePointArc((50, 27.25), (49.414213562, 25.835786438), (48, 25.25))
        make_face()
    extrude(amount=-SALIENTE_EXTRUIR14_DEPTH)

    # Croquis20 → Cortar-Extruir4 (cut)
    with BuildSketch(Plane.ZY):
        Polygon((-48, 25.25), (-50.733673202, 25.25), (-50.733673202, 24), (-50, 24), (-10, 24), (-10, 24.25), (-10, 25.25), (-11, 25.25), align=None)
    extrude(amount=-CORTAR_EXTRUIR4_DEPTH, mode=Mode.SUBTRACT)

    # Croquis21 → Saliente-Extruir15 (add)
    with BuildSketch(Plane.ZY):
        with BuildLine():
            Line((20, 14.944171176), (20, 14))
            Line((20, 14), (22.5, 14))
            ThreePointArc((22.5, 14), (18.838834765, 22.838834765), (10, 26.5))
            Line((10, 26.5), (-10, 26.5))
            Line((-10, 26.5), (-10, 24))
            Line((-10, 24), (-10, 23.944171176))
            Line((-10, 23.944171176), (-10, 20.944171176))
            Line((-10, 20.944171176), (-7, 20.944171176))
            Line((-7, 20.944171176), (14, 20.944171176))
            ThreePointArc((14, 20.944171176), (18.242640687, 19.186811864), (20, 14.944171176))
        make_face()
    extrude(amount=-SALIENTE_EXTRUIR15_DEPTH)

    # Croquis23 → Cortar-Extruir7 (cut)
    with BuildSketch(Plane(origin=(5, 0, 0), x_dir=(0, 0, -1), z_dir=(1, 0, 0))):
        Polygon((44, 56), (53.5, 56), (47.651340431, 26.5), (44, 26.5), align=None)
    extrude(amount=CORTAR_EXTRUIR7_DEPTH, mode=Mode.SUBTRACT)

    # Croquis39 → Saliente-Extruir27 (add)
    with BuildSketch(Plane(origin=(0, 0, 0), x_dir=(1, 0, 0), z_dir=(0, 1, 0))):
        Polygon((5, -26.5), (5, -35.5), (95, -35.5), (95, -26.5), (95, -22.5), (5, -22.5), align=None)
    extrude(amount=SALIENTE_EXTRUIR27_DEPTH)

    # Croquis40 → Cortar-Extruir12 (cut)
    with BuildSketch(Plane(origin=(95, 0, 0), x_dir=(0, 0, -1), z_dir=(1, 0, 0))):
        Polygon((-26.637690033, 14), (-35.5, 14), (-35.5, 0), (-26.9291309, 12.604008733), align=None)
    extrude(amount=-CORTAR_EXTRUIR12_DEPTH, mode=Mode.SUBTRACT)

    # Croquis41 → Cortar-Extruir13 (cut)
    with BuildSketch(Plane(origin=(0, -8.087799177, -40.793975597), x_dir=(1, 0, 0), z_dir=(0, 0.19447439298800823, 0.9809075952769181))):
        with Locations(Location((50, 58.257848261, 0), (0, 0, 270))):
            Circle(CROQUIS41_R)
    extrude(amount=-CORTAR_EXTRUIR13_DEPTH, mode=Mode.SUBTRACT)

    # Croquis42 → Cortar-Extruir14 (cut, through all)
    with BuildSketch(Plane(origin=(0, 26.5, 0), x_dir=(1, 0, 0), z_dir=(0, 1, 0))):
        with Locations((50, 45.825670215)):
            Rectangle(CROQUIS42_W, CROQUIS42_H)
    extrude(amount=-CORTAR_EXTRUIR14_DEPTH, mode=Mode.SUBTRACT)

    # Croquis37 → Cortar-Extruir15 (cut)
    with BuildSketch(Plane(origin=(0, 56, 0), x_dir=(1, 0, 0), z_dir=(0, 1, 0))):
        with Locations((97.5, 27)):
            Rectangle(CROQUIS37_W, CROQUIS37_H)
        with Locations((2.5, 27)):
            Rectangle(CROQUIS37_W, CROQUIS37_H)
    extrude(amount=-CORTAR_EXTRUIR15_DEPTH, mode=Mode.SUBTRACT)

    # Croquis44 → Cortar-Extruir16 (cut)
    with BuildSketch(Plane.XZ):
        with Locations(Location((50, 33.5, 0), (0, 0, 270))):
            Circle(CROQUIS44_R)
        with Locations(Location((33.5, 33.5, 0), (0, 0, 270))):
            Circle(CROQUIS44_R)
        with Locations(Location((16.5, 33.5, 0), (0, 0, 270))):
            Circle(CROQUIS44_R)
        with Locations(Location((83.5, 33.5, 0), (0, 0, 331.312619738))):
            Circle(CROQUIS44_R)
        with Locations(Location((66.5, 33.5, 0), (0, 0, 331.312619738))):
            Circle(CROQUIS44_R)
    extrude(amount=-CORTAR_EXTRUIR16_DEPTH, mode=Mode.SUBTRACT)


solid = part.part
